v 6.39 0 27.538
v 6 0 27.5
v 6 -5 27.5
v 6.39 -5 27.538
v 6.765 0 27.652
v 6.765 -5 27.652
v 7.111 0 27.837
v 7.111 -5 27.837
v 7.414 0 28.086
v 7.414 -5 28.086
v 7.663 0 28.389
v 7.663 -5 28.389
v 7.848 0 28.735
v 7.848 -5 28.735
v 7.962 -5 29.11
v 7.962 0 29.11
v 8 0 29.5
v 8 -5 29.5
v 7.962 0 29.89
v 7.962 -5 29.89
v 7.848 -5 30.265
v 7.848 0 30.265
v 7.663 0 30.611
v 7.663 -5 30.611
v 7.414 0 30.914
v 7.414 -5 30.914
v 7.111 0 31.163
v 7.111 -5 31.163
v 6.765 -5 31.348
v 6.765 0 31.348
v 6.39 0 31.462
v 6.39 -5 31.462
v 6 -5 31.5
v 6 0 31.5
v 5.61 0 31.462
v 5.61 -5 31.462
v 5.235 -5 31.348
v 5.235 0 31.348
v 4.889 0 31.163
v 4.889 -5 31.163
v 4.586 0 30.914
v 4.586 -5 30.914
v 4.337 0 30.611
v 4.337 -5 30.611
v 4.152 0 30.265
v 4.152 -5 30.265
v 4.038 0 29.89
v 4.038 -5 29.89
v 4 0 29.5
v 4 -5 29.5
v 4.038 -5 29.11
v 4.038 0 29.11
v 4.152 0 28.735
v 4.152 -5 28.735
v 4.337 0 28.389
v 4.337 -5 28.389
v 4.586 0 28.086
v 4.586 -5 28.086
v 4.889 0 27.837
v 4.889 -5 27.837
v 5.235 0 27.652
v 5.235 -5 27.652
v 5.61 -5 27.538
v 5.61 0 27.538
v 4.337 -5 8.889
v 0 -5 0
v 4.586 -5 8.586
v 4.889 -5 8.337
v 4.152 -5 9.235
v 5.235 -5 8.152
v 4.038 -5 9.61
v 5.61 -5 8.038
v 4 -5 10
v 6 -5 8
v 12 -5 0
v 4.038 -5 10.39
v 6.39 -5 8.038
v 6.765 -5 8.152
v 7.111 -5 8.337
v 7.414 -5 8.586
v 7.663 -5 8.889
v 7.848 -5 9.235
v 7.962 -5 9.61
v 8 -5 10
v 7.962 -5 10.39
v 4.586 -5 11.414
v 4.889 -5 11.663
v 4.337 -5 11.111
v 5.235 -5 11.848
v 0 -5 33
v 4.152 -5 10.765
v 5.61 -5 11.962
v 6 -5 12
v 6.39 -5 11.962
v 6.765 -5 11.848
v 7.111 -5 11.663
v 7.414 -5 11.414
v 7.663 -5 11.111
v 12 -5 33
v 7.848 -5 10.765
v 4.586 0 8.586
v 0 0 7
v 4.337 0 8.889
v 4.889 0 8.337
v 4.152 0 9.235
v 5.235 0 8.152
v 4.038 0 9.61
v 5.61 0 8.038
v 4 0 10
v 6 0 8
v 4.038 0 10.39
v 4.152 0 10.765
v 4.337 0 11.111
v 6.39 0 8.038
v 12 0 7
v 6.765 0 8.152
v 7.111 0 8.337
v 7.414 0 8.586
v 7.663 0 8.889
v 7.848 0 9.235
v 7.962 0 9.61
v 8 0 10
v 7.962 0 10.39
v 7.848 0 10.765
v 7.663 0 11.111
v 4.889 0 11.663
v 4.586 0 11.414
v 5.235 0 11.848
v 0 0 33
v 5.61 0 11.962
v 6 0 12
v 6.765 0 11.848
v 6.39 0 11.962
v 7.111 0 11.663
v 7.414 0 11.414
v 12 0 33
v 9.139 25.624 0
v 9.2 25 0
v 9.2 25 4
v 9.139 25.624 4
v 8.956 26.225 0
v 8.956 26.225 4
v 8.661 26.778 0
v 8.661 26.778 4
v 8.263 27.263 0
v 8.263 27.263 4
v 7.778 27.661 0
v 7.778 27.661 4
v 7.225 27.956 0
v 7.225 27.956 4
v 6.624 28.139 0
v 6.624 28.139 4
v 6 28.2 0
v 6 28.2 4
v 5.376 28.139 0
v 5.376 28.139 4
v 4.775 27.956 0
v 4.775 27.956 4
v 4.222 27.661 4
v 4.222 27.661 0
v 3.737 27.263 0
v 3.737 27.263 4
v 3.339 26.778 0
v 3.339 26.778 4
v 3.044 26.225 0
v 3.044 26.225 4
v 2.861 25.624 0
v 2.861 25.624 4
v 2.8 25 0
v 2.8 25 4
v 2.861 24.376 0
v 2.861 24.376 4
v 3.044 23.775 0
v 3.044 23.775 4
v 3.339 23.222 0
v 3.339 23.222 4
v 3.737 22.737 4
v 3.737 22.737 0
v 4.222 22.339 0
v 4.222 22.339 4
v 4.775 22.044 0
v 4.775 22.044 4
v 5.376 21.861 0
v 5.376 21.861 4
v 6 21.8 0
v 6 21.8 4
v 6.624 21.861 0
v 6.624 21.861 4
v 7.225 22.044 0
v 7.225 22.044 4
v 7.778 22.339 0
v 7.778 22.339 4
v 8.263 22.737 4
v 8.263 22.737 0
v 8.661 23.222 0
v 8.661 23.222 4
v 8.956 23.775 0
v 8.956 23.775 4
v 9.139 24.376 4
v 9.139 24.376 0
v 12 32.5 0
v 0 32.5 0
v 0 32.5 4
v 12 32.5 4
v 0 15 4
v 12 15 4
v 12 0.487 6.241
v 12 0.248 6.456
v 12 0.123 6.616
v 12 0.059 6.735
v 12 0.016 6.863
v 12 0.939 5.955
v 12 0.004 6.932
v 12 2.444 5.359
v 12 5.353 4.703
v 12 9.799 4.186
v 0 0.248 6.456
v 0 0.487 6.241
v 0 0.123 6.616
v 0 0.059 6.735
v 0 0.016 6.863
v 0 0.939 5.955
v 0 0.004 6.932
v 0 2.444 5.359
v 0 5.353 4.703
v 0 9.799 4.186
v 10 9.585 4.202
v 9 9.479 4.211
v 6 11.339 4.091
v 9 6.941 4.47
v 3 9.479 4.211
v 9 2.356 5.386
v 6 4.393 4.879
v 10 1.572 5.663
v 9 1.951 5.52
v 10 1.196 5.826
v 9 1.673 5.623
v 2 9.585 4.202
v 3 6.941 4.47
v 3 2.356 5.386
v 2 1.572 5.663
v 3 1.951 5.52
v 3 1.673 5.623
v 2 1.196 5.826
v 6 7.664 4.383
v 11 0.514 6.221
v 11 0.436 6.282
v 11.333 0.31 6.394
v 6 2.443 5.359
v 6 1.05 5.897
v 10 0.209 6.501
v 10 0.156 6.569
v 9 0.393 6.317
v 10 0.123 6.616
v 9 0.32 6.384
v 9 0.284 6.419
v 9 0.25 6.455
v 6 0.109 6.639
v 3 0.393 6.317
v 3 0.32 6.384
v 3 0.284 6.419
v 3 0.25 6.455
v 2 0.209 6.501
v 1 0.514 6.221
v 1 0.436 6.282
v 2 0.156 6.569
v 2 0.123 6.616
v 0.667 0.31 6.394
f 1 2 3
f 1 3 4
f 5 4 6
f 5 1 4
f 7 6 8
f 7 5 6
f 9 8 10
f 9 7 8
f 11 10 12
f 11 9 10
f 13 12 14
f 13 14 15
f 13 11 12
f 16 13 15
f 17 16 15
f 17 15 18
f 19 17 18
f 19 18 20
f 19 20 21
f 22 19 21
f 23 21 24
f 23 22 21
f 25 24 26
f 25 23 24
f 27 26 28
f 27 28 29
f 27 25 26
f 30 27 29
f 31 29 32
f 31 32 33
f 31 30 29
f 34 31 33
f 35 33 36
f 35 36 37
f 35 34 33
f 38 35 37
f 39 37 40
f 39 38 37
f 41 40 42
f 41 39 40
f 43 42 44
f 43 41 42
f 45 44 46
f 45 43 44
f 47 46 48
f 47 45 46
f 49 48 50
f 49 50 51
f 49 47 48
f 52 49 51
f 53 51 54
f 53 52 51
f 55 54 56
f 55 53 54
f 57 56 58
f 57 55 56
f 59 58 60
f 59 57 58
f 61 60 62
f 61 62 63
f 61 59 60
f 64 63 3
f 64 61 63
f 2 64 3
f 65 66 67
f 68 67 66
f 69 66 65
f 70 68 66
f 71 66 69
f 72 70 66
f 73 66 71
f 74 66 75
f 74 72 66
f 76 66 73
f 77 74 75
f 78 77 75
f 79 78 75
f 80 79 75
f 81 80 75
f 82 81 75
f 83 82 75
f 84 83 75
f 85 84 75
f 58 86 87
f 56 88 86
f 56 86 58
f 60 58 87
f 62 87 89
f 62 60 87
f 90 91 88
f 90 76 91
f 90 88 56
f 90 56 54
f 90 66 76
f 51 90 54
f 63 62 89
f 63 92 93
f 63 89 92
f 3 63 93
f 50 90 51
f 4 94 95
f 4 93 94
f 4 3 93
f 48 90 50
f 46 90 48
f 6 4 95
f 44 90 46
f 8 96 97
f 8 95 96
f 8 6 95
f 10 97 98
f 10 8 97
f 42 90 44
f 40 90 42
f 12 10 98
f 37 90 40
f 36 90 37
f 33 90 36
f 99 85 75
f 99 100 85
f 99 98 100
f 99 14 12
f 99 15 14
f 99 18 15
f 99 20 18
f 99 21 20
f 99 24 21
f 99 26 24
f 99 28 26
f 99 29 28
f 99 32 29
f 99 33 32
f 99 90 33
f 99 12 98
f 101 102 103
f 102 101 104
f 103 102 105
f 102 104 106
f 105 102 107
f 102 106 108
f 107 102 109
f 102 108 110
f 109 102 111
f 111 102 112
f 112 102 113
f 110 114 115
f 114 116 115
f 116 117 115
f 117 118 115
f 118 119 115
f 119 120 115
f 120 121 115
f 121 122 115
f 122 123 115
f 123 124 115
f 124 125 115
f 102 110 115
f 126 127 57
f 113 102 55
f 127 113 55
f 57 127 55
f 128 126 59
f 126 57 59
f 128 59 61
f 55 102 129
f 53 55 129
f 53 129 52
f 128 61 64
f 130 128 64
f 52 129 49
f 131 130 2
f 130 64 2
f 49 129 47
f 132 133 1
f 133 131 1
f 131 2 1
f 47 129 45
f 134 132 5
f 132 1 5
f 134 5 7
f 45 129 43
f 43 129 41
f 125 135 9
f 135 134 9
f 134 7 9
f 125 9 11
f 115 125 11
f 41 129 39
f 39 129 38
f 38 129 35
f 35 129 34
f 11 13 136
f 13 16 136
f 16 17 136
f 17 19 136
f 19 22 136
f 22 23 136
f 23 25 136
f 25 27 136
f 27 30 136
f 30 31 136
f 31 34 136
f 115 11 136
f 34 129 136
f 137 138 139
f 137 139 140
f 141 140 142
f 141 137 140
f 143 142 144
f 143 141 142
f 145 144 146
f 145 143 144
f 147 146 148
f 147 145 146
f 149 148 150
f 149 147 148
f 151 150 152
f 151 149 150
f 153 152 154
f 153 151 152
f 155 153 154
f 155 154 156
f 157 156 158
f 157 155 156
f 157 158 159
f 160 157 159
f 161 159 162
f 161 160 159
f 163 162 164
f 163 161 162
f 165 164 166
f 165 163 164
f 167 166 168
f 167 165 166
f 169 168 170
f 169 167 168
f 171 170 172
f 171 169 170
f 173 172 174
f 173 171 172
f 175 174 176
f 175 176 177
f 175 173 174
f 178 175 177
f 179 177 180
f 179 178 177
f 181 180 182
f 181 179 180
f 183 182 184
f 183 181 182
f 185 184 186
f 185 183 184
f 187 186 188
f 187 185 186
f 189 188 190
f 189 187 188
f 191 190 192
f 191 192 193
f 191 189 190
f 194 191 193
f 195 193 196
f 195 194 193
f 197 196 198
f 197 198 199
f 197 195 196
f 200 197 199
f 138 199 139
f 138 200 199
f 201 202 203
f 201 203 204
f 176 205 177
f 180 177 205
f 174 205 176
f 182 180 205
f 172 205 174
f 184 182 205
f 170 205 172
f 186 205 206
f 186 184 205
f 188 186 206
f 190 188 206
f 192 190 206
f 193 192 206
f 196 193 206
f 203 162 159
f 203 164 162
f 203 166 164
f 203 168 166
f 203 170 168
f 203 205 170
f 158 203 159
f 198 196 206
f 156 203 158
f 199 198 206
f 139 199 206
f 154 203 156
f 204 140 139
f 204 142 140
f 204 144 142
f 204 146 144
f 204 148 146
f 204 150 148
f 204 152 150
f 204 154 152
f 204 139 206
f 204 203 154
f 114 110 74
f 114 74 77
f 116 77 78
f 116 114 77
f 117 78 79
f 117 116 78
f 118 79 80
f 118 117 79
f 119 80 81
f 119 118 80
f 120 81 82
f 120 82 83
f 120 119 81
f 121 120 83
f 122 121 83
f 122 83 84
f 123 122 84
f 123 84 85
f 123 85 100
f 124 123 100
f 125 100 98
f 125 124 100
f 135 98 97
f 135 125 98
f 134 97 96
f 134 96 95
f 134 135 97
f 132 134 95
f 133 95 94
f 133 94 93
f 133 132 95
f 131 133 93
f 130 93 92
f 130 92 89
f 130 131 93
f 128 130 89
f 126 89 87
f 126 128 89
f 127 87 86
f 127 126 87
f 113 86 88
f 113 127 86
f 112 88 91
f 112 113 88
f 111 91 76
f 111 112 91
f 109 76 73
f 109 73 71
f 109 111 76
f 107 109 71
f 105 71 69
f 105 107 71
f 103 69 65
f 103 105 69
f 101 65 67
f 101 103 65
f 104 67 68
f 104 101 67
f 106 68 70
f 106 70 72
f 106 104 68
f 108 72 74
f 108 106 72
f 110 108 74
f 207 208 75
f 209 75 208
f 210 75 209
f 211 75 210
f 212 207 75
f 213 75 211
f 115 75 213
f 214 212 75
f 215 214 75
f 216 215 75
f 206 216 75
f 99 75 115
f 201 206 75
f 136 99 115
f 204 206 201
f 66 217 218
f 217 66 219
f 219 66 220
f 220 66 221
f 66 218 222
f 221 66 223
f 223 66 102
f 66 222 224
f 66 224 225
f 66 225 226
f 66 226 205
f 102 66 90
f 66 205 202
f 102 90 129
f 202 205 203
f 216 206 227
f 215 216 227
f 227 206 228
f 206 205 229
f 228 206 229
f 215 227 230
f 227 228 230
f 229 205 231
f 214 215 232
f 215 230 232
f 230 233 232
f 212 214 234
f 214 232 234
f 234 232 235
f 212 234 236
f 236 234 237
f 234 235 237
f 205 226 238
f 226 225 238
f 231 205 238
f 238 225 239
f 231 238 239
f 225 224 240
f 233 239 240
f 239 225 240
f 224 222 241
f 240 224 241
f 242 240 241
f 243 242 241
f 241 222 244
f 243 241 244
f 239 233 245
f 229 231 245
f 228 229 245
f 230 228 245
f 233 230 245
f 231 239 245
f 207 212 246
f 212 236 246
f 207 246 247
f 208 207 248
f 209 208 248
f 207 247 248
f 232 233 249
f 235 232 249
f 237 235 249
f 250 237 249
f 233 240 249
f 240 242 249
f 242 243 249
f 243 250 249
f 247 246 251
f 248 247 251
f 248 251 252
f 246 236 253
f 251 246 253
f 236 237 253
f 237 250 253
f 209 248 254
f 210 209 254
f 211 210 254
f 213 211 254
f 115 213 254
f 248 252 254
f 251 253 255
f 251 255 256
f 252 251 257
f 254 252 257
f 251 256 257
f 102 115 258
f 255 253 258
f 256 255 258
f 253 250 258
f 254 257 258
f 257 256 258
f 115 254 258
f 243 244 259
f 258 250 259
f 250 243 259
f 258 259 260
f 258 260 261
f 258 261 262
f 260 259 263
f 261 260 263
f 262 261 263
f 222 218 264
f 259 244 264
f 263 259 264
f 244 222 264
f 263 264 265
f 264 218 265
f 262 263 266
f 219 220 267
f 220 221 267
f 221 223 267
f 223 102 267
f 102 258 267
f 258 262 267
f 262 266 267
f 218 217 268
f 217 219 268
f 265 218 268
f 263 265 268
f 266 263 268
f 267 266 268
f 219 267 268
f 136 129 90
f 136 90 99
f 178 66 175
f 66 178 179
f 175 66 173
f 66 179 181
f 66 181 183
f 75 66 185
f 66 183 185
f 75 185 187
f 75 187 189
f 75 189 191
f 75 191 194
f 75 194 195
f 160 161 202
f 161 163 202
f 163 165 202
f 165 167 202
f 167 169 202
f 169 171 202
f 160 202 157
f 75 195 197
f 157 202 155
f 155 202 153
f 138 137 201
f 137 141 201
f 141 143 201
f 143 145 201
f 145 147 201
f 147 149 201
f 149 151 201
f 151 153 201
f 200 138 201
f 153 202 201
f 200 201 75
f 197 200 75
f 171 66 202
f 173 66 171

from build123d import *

# Parameters (mm, degrees)
SKETCH1_W           = 12
SKETCH1_H           = 32.5
SKETCH1_R           = 3.2
BOSS_EXTRUDE1_DEPTH = 4
SKETCH2_W           = 12
SKETCH2_H           = 33
SKETCH2_R           = 2
BOSS_EXTRUDE2_DEPTH = 5
FILLET1_SIZE        = 15
FILLET1_SIZE_2      = 3


with BuildPart() as part:
    # Sketch1 → Boss-Extrude1 (new body)
    with BuildSketch(Plane.XY):
        with Locations((6, 16.25)):
            Rectangle(SKETCH1_W, SKETCH1_H)
        with Locations((6, 25)):
            Circle(SKETCH1_R, mode=Mode.SUBTRACT)
    extrude(amount=BOSS_EXTRUDE1_DEPTH)

    # Sketch2 → Boss-Extrude2 (add)
    with BuildSketch(Plane.XZ):
        with Locations((6, 16.5)):
            Rectangle(SKETCH2_W, SKETCH2_H)
        with Locations(Location((6, 10, 0), (0, 0, 270))):
            Circle(SKETCH2_R, mode=Mode.SUBTRACT)
        with Locations(Location((6, 29.5, 0), (0, 0, 270))):
            Circle(SKETCH2_R, mode=Mode.SUBTRACT)
    extrude(amount=BOSS_EXTRUDE2_DEPTH)

    # Fillet1
    # an asymmetric fillet: 15, 3 mm, written as the material it adds along each edge
    with BuildSketch(Plane(origin=(0, 0, 4), x_dir=(0, 1, 0), z_dir=(1, 0, 0))) as fillet1_piece_1:
        with BuildLine():
            Bezier((FILLET1_SIZE, 0), (0, 0), (0, FILLET1_SIZE_2), weights=[1, 0.707106781, 1])
            Line((0, FILLET1_SIZE_2), (0, 0))
            Line((0, 0), (FILLET1_SIZE, 0))
        make_face()
    extrude(amount=12)


solid = part.part
